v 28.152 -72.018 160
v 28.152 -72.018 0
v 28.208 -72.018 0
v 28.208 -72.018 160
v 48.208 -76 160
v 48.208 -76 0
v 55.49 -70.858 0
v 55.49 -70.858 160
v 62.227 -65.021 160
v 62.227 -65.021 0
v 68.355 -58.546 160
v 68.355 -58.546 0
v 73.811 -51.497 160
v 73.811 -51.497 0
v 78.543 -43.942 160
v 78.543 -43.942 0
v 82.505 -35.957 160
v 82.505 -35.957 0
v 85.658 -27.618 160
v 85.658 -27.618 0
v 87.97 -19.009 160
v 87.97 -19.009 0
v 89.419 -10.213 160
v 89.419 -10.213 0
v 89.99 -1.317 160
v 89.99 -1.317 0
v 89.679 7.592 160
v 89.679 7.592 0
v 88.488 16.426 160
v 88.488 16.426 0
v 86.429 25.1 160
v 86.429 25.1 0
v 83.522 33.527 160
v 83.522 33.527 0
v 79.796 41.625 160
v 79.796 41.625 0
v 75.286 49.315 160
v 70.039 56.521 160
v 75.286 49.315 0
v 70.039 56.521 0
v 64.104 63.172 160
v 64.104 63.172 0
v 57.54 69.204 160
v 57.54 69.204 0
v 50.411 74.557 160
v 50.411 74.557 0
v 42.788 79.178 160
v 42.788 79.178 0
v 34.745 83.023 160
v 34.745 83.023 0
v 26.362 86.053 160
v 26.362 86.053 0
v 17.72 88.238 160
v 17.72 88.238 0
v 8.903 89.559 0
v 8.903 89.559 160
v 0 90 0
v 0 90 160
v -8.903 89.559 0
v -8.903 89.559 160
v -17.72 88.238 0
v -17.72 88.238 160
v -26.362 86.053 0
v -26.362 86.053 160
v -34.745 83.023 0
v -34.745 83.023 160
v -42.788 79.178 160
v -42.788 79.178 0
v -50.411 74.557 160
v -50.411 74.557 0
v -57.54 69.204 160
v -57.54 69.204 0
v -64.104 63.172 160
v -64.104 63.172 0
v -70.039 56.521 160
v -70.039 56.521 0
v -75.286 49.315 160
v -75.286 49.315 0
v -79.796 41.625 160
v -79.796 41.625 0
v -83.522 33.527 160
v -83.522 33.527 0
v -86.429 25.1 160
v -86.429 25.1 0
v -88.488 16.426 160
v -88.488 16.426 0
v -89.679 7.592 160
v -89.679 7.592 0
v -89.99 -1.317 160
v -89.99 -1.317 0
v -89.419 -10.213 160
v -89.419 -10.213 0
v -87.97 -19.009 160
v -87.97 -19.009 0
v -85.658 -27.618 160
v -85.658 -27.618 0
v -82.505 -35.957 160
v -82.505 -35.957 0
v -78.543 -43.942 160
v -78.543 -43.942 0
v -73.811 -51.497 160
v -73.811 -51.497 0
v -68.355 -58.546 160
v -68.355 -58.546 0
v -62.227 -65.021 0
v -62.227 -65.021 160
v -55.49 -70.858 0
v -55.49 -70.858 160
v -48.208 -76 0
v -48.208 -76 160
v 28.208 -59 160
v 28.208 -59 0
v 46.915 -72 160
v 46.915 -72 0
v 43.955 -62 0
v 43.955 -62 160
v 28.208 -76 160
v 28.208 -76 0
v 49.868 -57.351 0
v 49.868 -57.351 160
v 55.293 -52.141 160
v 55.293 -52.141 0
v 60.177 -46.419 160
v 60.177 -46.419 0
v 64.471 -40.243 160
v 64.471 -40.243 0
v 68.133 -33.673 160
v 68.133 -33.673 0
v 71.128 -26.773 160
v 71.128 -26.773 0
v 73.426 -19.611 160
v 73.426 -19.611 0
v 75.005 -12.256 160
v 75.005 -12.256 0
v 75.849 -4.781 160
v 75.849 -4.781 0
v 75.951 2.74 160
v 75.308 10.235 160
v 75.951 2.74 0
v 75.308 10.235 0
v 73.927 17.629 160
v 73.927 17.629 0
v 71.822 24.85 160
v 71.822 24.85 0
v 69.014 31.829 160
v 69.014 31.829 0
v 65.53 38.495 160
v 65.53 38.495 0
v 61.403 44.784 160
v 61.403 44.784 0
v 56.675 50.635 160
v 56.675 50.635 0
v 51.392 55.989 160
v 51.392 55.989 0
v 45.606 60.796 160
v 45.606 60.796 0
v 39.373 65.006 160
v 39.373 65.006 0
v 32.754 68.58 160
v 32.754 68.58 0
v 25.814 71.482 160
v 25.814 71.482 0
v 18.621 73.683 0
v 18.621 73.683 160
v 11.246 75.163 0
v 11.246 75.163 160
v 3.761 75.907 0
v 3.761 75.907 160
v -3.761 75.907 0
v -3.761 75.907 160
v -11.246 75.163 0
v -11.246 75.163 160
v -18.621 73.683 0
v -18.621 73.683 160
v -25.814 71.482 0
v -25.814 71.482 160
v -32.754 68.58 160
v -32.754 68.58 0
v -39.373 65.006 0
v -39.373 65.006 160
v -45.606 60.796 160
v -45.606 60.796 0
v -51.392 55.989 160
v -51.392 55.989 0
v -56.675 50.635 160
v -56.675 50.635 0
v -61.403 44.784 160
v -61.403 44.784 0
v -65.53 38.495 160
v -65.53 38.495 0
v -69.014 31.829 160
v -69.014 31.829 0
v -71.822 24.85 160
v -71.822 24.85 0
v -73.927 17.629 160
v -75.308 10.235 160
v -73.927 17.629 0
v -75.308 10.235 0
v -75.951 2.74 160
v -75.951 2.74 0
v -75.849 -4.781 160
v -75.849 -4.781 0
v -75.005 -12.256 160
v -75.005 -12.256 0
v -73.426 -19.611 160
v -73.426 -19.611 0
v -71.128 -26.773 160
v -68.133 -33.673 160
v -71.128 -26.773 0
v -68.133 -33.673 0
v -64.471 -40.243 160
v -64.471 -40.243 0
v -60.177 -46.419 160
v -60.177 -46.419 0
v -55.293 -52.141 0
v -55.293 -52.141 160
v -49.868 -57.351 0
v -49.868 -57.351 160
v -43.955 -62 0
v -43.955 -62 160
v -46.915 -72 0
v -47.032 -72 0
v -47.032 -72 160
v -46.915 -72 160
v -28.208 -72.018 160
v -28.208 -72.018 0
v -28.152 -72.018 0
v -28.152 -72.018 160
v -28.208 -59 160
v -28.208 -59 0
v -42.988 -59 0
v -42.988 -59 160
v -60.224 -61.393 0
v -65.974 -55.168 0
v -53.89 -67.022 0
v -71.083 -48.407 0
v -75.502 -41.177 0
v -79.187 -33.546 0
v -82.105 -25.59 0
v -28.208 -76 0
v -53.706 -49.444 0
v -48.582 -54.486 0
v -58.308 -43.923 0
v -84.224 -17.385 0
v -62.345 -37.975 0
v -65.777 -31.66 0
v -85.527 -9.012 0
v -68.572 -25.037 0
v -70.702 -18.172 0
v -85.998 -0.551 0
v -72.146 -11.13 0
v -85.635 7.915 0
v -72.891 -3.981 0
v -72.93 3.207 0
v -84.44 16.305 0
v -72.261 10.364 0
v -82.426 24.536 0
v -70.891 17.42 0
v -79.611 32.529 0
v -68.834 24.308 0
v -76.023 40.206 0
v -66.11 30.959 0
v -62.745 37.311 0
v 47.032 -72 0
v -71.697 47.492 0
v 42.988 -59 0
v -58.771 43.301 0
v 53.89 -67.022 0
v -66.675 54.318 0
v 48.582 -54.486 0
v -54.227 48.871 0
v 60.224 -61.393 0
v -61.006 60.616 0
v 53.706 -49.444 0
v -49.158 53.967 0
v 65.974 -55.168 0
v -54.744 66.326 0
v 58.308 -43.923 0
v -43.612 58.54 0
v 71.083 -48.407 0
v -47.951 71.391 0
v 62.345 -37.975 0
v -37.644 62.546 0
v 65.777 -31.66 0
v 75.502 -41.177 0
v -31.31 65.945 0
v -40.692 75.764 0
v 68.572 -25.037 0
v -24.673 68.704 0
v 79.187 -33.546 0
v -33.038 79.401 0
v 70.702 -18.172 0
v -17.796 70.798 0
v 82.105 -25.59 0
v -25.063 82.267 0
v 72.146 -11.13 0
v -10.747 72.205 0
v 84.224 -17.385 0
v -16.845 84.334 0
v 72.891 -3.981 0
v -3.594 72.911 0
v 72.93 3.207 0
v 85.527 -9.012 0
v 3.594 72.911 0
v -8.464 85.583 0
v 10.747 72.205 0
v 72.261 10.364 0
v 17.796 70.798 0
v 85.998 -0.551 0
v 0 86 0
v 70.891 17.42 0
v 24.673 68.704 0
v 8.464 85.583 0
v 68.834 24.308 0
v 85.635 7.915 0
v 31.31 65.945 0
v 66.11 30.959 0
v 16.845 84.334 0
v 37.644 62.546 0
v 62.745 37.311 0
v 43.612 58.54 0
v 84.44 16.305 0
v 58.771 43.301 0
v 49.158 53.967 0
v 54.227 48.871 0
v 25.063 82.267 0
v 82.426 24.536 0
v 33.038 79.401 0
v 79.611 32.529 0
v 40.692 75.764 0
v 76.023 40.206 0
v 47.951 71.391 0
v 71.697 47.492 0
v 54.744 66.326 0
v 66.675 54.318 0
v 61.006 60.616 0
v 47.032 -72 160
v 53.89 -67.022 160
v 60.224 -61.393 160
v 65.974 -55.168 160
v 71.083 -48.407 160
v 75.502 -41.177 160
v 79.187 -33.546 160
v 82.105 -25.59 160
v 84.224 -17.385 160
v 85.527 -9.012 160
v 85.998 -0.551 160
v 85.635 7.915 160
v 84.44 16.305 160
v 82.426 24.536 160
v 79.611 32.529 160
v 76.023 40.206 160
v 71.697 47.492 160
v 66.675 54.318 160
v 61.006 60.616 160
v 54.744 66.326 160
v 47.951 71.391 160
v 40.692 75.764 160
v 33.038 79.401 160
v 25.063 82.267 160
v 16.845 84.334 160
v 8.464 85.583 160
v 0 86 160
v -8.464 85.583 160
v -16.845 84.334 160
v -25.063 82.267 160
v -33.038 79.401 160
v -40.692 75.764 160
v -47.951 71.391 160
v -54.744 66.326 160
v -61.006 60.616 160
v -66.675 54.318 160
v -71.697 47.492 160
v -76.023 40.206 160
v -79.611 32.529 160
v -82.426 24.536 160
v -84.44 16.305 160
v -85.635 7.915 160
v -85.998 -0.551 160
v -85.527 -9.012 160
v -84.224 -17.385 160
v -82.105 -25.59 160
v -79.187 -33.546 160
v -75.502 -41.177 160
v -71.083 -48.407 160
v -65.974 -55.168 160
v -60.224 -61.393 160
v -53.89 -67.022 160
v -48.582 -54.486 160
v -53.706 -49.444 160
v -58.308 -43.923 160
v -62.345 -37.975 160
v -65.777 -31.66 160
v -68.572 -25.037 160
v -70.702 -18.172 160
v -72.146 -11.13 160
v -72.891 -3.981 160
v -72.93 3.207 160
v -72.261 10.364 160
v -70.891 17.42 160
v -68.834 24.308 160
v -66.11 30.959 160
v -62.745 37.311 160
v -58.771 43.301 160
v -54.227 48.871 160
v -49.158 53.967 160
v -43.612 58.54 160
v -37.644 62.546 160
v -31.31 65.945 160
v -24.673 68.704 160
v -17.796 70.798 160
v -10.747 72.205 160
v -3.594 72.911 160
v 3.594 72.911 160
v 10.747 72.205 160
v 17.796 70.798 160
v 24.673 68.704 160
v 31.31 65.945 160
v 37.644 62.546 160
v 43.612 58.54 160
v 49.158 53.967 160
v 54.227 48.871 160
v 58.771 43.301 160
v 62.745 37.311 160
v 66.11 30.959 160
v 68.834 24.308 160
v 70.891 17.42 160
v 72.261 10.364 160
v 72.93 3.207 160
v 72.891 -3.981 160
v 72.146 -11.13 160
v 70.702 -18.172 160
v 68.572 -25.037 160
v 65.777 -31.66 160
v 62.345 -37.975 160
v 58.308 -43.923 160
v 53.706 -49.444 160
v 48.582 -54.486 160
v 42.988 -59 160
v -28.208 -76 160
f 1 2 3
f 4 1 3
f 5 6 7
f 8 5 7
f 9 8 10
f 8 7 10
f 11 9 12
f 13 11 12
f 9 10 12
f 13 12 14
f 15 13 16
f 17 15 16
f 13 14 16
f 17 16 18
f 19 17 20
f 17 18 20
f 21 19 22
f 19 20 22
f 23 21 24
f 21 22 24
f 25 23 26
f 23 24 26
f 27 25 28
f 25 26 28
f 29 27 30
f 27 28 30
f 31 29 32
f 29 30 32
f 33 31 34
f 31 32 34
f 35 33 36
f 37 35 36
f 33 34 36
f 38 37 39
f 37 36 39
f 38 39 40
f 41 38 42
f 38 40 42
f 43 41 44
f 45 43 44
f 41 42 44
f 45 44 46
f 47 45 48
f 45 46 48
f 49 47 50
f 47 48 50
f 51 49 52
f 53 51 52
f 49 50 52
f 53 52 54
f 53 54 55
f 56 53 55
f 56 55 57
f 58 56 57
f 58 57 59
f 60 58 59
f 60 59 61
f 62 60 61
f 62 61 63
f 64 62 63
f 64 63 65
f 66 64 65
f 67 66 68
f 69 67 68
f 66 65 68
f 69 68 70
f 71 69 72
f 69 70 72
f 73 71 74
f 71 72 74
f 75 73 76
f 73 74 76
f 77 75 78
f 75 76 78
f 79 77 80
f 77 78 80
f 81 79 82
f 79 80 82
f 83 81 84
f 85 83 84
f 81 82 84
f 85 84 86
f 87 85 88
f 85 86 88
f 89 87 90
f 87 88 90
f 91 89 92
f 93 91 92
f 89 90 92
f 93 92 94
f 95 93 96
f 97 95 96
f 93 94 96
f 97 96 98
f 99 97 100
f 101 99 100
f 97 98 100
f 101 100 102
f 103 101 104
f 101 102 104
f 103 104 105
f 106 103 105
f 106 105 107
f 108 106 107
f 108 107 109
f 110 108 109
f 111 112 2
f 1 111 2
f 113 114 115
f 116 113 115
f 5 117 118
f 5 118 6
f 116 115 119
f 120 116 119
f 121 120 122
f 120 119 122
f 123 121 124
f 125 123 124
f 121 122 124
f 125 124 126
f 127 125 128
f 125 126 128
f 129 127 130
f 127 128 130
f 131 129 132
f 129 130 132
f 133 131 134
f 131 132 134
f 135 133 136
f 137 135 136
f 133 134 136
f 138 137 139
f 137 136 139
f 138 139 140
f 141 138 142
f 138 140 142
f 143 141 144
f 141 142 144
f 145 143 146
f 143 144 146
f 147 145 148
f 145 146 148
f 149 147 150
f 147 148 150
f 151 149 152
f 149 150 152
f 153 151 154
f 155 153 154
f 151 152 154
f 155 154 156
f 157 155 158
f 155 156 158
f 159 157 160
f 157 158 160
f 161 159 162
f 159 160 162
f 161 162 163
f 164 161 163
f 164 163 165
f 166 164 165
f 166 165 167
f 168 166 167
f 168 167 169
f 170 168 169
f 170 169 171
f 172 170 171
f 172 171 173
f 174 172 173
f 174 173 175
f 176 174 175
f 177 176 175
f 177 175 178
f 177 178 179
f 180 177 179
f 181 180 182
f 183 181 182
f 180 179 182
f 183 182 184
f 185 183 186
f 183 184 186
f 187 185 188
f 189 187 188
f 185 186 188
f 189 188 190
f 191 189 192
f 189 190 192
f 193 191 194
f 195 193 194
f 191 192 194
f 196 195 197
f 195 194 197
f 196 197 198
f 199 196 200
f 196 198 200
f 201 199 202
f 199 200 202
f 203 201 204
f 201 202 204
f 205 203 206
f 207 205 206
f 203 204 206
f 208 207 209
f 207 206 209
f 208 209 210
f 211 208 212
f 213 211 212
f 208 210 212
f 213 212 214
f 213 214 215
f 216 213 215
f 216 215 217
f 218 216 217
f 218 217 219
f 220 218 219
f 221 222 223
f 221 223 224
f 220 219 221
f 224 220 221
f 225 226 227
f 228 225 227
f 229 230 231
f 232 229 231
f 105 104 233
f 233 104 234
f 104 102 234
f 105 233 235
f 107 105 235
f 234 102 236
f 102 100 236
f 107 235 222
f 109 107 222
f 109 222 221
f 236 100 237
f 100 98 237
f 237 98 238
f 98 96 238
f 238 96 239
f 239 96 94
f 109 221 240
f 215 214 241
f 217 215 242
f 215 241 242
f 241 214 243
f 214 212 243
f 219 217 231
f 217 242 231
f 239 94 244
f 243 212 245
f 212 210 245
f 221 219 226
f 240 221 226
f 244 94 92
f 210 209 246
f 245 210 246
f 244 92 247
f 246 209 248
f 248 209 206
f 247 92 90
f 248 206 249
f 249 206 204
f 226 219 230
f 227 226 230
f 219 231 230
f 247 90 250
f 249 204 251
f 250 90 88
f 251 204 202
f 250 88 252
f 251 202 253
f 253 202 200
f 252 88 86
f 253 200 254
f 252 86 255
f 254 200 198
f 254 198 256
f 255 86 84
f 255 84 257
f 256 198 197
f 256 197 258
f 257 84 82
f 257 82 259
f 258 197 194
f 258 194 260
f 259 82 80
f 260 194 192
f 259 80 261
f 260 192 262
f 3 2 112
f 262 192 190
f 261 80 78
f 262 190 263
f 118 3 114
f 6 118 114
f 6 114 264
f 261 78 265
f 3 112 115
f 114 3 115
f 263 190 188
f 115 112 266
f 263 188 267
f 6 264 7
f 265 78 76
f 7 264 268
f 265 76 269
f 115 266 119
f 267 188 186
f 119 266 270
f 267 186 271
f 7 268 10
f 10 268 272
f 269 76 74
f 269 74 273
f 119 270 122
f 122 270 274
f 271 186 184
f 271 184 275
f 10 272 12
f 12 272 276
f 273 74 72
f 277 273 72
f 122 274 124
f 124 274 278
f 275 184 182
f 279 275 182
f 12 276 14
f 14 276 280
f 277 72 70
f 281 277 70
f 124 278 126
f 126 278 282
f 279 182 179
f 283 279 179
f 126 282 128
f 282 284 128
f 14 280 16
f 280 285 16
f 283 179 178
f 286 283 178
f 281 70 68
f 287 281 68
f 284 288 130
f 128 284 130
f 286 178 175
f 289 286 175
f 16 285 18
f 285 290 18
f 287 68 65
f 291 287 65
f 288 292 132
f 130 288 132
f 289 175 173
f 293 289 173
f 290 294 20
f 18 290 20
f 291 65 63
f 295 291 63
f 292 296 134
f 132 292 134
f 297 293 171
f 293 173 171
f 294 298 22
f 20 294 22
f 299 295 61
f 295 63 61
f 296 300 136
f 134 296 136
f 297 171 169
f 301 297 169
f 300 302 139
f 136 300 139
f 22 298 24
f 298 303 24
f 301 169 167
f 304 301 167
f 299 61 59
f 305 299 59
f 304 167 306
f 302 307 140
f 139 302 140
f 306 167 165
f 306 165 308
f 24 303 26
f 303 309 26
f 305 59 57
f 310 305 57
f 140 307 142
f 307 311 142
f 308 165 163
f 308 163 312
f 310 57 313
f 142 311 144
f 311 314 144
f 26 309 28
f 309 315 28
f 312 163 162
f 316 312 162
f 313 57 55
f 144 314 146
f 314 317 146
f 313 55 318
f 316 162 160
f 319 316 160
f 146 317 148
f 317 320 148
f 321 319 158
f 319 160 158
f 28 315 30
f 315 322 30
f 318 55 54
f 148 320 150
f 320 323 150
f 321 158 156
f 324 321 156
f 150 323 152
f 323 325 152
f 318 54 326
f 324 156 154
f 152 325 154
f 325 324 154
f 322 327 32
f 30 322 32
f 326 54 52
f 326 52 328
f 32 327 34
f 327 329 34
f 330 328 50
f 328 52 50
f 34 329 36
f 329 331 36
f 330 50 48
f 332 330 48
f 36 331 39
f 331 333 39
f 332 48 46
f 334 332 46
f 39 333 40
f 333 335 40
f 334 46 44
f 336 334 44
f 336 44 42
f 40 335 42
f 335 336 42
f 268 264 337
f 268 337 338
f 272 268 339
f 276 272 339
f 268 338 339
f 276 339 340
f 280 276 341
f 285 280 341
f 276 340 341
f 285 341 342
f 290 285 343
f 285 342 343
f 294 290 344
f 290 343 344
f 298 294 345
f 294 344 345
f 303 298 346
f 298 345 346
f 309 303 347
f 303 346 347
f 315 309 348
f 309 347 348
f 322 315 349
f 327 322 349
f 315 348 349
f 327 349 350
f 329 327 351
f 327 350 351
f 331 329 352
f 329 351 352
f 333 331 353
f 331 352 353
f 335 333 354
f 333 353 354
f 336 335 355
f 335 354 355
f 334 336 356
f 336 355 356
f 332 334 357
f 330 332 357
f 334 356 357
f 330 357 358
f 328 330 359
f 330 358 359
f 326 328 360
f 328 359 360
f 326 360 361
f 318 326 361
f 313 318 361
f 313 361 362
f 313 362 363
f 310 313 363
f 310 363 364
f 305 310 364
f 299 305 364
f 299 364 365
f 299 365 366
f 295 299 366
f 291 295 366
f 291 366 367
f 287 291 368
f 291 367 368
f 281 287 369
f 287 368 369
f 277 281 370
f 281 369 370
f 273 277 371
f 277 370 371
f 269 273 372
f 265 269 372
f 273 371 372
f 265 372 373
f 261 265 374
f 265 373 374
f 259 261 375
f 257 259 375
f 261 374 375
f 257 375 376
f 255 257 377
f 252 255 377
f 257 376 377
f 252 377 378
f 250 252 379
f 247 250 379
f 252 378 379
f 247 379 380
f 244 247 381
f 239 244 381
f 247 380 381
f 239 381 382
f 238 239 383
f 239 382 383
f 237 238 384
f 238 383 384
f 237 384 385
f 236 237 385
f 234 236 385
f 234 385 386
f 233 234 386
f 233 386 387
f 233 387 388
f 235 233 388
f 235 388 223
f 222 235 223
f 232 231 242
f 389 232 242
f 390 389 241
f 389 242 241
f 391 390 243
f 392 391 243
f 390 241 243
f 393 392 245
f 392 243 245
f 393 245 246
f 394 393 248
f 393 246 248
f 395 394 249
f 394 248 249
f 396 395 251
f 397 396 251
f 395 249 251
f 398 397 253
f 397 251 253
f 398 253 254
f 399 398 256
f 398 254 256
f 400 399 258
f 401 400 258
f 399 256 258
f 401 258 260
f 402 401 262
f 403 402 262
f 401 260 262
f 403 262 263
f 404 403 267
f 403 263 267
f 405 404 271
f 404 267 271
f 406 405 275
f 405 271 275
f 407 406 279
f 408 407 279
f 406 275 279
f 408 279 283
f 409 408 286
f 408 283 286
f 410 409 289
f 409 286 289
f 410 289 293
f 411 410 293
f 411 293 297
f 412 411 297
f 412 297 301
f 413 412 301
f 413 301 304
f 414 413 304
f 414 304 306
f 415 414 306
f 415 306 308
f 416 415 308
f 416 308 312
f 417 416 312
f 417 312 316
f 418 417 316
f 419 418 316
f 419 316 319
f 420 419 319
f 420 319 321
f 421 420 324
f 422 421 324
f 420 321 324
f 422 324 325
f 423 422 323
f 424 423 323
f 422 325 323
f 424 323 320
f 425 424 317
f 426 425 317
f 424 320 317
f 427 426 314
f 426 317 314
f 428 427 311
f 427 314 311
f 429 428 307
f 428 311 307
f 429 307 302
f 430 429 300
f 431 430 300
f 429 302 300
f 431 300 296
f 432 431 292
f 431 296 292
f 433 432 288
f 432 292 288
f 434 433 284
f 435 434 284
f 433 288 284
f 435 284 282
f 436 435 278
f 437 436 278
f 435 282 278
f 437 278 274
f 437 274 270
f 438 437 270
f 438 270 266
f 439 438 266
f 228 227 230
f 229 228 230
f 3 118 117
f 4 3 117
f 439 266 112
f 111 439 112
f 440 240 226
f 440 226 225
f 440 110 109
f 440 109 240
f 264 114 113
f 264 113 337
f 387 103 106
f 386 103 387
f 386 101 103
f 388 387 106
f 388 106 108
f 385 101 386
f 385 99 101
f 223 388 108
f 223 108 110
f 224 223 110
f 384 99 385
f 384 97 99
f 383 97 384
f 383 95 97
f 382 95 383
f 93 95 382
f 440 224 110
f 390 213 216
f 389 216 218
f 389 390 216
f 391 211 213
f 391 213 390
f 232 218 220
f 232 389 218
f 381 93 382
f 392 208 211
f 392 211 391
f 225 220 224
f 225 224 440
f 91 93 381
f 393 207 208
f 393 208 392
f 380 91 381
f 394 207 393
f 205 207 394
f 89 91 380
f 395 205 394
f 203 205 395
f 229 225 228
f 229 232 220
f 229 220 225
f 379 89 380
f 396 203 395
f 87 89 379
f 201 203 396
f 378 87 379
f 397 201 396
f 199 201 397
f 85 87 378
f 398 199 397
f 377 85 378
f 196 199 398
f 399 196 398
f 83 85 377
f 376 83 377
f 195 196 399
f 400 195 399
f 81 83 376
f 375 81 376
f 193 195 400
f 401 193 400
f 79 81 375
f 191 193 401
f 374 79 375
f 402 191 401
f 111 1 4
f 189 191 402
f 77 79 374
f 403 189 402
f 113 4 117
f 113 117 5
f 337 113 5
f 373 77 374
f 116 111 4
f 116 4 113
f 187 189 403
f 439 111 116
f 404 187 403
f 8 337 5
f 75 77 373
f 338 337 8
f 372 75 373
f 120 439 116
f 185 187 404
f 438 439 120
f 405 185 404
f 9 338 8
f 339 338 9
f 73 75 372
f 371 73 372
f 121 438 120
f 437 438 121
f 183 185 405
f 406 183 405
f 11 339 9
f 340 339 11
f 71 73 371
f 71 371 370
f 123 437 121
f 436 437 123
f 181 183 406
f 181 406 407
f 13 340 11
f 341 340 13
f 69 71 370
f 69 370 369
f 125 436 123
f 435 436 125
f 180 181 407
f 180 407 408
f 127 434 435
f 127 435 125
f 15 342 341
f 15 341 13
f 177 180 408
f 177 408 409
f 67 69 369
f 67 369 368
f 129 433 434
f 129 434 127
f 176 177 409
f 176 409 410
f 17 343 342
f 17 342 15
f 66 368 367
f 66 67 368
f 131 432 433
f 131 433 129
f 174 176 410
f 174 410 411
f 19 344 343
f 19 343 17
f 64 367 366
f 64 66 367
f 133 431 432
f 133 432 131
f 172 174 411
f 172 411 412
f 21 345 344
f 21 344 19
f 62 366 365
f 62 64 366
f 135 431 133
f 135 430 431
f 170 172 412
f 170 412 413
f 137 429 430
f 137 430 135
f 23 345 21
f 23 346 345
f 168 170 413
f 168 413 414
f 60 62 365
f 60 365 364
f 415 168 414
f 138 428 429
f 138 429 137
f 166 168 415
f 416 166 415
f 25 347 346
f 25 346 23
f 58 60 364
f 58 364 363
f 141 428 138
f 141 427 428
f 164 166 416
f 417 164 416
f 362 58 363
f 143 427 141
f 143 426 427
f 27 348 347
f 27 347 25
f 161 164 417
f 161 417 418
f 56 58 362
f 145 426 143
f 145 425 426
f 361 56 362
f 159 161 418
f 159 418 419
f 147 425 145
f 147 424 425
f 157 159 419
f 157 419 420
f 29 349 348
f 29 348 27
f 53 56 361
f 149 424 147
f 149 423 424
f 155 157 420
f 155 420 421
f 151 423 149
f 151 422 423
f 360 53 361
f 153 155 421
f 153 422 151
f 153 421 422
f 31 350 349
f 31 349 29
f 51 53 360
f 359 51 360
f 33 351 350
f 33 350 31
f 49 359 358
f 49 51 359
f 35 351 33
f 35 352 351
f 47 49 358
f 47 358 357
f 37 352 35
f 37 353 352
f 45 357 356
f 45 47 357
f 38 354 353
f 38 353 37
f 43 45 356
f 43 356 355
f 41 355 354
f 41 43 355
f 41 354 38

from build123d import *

# Parameters (mm, degrees)
F1_DEPTH = 160
F3_DEPTH = 160
F4_W     = 56.415766
F4_H     = 160
F5_DEPTH = 4
F7_DEPTH = 160


with BuildPart() as f1:
    # F0 (on Top) → F1 (new body)
    with BuildSketch(Plane.XY):
        with BuildLine():
            Line((-48.207883, -76), (48.207883, -76))
            ThreePointArc((48.207883, -76), (0, 90), (-48.207883, -76))
        make_face()
    extrude(amount=F1_DEPTH)

    # F2 (on face) → F3 (cut, through all)
    with BuildSketch(Plane.XY.offset(160)):
        with BuildLine():
            Line((-47.031904, -72), (47.031904, -72))
            ThreePointArc((47.031904, -72), (0, 86), (-47.031904, -72))
        make_face()
    extrude(amount=-F3_DEPTH, mode=Mode.SUBTRACT)

    # F4 (on face) → F5 (cut, through all)
    with BuildSketch(Plane.XZ.offset(76)):
        with Locations((0, 80)):
            Rectangle(F4_W, F4_H)
    extrude(amount=-F5_DEPTH, mode=Mode.SUBTRACT)

    # F6 (on Top) → F7 (join)
    with BuildSketch(Plane.XY):
        with BuildLine():
            Line((46.919916, -72.018087), (43.954522, -62))
            ThreePointArc((43.954522, -62), (0, 76), (-43.954522, -62))
            Line((-43.954522, -62), (-46.919916, -72.018087))
            Line((-46.919916, -72.018087), (-28.151507, -72.018087))
            Line((-28.151507, -72.018087), (-28.207883, -59))
            Line((-28.207883, -59), (-42.988371, -59))
            ThreePointArc((-42.988371, -59), (0, 73), (42.988371, -59))
            Line((42.988371, -59), (28.207883, -59))
            Line((28.207883, -59), (28.151507, -72.018087))
            Line((28.151507, -72.018087), (46.919916, -72.018087))
        make_face()
    extrude(amount=F7_DEPTH)


solid = f1.part
